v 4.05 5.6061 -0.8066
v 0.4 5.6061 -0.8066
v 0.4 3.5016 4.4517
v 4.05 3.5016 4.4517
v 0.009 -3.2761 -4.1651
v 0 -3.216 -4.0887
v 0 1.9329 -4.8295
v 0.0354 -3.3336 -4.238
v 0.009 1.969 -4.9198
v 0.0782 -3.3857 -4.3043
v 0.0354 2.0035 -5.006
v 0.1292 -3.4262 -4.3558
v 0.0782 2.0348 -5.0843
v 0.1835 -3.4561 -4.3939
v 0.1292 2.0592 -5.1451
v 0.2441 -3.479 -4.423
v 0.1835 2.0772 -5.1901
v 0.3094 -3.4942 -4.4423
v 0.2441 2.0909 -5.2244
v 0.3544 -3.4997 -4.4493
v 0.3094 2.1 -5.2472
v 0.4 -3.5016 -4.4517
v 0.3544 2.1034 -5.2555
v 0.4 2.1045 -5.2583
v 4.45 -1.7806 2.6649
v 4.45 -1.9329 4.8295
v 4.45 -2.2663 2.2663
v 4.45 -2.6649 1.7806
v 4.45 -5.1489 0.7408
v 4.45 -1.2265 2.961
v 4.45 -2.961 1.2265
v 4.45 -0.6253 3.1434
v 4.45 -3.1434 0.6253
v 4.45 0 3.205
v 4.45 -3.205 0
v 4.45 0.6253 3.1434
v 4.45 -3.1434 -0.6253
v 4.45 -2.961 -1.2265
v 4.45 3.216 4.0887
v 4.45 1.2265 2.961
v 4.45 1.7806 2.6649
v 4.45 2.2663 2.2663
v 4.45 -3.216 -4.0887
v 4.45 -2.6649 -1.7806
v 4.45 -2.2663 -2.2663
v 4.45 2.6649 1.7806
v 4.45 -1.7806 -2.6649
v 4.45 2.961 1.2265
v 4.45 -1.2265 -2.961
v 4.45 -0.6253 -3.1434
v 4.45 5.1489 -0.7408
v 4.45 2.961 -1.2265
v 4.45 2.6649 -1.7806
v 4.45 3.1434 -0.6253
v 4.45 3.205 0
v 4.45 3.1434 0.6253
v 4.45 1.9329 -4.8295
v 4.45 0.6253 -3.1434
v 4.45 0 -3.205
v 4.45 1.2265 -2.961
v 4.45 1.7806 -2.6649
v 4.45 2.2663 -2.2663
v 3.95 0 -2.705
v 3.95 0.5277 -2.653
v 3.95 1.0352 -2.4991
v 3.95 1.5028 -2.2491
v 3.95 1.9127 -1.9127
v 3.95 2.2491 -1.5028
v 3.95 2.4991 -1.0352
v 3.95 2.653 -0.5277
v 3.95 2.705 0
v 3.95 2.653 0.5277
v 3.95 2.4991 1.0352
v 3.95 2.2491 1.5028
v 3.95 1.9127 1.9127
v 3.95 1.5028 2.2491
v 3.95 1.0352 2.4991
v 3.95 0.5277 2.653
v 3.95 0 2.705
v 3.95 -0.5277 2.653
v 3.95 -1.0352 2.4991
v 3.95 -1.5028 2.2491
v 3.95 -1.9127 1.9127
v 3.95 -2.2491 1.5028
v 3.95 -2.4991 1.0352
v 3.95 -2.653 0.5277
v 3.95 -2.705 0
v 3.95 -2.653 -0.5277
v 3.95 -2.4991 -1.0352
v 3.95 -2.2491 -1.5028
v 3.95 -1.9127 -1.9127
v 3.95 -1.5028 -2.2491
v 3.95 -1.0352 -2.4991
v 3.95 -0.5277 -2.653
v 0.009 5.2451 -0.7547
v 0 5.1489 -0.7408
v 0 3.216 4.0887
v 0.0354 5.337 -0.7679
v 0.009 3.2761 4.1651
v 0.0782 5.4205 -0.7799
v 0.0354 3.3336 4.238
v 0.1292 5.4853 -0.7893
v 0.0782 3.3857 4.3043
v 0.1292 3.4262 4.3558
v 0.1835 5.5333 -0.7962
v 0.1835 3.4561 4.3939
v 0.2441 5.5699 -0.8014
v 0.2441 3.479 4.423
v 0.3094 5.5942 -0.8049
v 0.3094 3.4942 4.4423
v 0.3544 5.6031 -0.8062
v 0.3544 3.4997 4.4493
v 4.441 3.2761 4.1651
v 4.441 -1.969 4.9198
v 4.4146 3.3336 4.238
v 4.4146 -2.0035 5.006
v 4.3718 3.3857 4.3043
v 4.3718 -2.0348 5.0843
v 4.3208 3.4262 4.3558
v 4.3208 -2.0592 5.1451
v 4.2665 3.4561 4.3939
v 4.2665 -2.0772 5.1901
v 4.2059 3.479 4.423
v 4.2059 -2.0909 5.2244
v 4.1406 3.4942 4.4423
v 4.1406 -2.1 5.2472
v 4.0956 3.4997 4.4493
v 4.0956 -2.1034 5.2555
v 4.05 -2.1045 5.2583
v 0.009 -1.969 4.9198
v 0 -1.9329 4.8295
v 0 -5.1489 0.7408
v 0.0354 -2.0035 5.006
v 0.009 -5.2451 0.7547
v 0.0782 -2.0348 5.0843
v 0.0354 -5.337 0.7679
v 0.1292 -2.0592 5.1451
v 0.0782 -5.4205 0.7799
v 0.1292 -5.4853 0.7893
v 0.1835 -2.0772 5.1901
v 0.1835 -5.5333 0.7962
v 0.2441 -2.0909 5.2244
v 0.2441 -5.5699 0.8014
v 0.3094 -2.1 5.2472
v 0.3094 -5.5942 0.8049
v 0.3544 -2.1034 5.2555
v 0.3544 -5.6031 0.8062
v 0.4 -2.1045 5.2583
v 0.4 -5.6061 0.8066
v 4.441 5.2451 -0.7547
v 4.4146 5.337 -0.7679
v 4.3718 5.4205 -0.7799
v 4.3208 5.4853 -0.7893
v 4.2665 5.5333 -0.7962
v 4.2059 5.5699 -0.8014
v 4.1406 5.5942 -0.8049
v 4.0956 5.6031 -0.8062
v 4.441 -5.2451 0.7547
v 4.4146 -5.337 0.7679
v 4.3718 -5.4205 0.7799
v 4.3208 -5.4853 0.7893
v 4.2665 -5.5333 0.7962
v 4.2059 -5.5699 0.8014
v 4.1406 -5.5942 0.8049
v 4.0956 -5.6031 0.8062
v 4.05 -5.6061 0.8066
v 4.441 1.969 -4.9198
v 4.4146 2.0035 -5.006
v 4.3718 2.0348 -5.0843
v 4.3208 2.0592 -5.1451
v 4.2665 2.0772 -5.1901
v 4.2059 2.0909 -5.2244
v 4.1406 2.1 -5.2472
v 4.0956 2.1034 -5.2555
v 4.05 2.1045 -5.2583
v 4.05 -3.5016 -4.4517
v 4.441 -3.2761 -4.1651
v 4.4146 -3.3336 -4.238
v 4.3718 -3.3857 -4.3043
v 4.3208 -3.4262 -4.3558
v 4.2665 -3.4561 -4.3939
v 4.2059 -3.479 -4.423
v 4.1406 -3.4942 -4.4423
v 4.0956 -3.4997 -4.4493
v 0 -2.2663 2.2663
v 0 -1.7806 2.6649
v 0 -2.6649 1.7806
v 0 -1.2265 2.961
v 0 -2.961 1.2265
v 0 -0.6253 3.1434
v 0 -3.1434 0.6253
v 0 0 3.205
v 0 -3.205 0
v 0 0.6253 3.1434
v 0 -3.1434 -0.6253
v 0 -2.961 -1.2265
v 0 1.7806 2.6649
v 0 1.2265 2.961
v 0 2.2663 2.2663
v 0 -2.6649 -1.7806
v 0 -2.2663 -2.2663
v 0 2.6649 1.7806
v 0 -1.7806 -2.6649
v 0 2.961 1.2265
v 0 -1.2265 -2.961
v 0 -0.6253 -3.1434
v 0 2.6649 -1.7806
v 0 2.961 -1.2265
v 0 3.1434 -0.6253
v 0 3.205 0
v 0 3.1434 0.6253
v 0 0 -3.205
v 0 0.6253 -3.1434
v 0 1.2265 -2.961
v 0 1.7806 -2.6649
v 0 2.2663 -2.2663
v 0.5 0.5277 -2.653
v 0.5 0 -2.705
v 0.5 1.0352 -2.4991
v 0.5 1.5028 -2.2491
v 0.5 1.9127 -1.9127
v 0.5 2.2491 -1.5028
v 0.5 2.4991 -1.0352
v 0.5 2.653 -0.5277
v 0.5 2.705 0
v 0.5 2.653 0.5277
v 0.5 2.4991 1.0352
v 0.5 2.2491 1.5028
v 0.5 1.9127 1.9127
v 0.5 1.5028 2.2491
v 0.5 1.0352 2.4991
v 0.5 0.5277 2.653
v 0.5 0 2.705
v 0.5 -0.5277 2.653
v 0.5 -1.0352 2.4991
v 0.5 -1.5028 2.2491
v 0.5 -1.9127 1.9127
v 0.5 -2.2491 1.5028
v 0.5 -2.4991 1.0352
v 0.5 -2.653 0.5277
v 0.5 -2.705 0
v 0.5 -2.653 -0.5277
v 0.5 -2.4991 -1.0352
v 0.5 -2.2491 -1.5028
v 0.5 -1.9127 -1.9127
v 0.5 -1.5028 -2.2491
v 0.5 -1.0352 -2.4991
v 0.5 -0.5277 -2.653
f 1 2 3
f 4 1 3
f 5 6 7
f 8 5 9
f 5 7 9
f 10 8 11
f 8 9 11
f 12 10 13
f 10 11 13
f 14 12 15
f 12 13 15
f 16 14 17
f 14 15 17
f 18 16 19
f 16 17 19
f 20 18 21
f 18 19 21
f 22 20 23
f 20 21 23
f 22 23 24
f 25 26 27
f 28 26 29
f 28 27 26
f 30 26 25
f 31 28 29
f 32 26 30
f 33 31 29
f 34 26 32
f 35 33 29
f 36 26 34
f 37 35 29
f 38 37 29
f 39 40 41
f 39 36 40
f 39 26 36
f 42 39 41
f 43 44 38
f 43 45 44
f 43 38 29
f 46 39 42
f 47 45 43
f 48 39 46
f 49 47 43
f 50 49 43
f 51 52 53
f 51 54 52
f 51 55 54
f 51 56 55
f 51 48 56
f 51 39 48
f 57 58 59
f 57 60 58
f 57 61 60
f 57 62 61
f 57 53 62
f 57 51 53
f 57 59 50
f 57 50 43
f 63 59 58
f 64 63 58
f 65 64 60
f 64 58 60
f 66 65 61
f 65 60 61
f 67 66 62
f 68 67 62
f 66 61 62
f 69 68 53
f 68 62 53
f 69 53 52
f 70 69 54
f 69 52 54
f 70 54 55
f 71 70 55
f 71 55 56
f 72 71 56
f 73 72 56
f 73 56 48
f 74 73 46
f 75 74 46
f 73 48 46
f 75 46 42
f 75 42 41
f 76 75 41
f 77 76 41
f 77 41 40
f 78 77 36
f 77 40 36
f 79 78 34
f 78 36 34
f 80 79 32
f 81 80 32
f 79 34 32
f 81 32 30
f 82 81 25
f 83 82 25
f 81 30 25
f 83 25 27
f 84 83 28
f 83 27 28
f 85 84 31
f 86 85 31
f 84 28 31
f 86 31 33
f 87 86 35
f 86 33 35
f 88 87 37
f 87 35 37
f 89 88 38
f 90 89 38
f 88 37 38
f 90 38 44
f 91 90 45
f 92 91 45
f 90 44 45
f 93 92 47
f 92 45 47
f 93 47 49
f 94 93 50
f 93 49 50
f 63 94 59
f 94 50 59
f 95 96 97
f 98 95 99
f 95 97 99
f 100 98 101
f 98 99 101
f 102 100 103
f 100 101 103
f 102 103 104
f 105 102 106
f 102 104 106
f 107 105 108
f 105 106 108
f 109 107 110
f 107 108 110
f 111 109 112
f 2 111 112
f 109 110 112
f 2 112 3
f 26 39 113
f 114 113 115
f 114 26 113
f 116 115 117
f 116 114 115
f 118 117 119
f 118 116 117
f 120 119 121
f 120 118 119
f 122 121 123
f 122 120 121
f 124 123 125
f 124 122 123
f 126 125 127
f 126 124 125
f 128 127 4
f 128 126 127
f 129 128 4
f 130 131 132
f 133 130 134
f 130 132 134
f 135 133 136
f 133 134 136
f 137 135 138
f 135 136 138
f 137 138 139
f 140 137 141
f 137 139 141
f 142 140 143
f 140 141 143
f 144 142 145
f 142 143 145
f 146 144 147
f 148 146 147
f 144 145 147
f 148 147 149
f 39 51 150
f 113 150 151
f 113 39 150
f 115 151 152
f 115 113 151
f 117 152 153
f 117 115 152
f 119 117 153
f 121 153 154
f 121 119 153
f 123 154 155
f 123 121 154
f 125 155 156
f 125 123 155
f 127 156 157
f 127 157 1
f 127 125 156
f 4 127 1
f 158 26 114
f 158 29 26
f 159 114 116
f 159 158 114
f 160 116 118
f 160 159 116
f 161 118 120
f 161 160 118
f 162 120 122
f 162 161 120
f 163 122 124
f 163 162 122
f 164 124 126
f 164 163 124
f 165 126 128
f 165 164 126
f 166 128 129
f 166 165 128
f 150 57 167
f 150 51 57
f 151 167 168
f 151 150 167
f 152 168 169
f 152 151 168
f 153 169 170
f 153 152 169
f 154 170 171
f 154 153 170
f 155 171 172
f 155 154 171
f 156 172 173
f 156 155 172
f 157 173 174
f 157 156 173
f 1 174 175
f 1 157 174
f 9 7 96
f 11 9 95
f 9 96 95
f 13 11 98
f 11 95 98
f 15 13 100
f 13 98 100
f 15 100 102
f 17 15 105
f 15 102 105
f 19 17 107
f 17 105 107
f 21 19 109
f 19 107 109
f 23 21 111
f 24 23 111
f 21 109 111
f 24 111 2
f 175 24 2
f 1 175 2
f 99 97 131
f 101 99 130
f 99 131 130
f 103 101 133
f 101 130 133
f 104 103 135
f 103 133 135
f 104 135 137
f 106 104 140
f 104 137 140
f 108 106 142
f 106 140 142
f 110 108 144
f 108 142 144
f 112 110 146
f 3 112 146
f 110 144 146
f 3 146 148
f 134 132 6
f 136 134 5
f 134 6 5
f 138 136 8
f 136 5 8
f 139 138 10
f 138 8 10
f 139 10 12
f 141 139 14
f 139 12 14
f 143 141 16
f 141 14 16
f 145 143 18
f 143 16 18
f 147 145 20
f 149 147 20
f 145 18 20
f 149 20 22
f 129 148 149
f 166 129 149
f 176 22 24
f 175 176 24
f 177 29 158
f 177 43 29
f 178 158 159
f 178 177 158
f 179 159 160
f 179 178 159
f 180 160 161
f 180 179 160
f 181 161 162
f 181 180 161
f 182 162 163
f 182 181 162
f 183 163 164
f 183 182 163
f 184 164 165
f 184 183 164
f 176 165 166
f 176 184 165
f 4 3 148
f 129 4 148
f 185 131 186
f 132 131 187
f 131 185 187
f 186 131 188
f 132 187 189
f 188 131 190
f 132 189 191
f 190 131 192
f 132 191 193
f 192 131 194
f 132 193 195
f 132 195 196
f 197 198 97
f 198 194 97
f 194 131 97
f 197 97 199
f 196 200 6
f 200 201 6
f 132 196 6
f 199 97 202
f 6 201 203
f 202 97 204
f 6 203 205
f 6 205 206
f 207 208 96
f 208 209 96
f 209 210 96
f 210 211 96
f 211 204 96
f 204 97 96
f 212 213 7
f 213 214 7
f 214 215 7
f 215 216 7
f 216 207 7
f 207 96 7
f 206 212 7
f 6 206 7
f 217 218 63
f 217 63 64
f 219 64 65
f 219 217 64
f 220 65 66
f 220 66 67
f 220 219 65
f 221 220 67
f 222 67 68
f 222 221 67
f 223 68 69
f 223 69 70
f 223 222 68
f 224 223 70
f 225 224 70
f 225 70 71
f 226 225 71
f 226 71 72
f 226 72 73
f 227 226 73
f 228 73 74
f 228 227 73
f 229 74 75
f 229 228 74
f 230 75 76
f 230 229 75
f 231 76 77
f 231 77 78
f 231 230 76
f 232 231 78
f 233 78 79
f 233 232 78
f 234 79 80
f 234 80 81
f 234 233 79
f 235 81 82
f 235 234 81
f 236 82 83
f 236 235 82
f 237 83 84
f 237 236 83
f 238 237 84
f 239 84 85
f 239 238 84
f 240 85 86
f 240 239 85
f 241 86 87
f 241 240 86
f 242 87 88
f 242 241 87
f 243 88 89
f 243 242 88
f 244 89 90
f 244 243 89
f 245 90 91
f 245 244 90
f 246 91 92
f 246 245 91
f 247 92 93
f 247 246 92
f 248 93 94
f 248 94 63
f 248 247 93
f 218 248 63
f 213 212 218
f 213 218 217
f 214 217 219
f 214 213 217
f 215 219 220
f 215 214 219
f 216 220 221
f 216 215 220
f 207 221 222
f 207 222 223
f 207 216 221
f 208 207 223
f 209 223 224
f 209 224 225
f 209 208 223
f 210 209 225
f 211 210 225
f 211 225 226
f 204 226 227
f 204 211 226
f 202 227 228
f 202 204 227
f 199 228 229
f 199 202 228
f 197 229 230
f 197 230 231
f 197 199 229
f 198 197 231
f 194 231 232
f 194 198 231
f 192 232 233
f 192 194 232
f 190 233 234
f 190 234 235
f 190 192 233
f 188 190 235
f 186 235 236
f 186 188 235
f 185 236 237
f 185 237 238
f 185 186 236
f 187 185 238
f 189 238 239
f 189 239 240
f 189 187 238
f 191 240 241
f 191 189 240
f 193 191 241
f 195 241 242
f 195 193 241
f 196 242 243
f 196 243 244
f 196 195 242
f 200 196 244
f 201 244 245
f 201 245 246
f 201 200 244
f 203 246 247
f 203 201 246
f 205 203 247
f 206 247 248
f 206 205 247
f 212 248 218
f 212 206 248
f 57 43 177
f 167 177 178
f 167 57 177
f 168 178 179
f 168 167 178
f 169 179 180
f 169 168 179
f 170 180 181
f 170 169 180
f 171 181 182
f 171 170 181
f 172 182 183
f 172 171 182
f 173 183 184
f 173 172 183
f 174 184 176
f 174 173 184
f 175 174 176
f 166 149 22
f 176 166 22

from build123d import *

# Parameters (mm, degrees)
SKETCH1_R           = 2.705
BOSS_EXTRUDE1_DEPTH = 4.45
CHAMFER1_SIZE       = 0.5
FILLET1_R           = 0.4


with BuildPart() as part:
    # Sketch1 → Boss-Extrude1 (new body)
    with BuildSketch(Plane(origin=(0, 0, 0), x_dir=(0, 0, -1), z_dir=(1, 0, 0))):
        Polygon((0.806629144, 5.606072549), (-4.451686671, 3.501597604), (-5.258315815, -2.104474945), (-0.806629144, -5.606072549), (4.451686671, -3.501597604), (5.258315815, 2.104474945), align=None)
        Circle(SKETCH1_R, mode=Mode.SUBTRACT)
    extrude(amount=BOSS_EXTRUDE1_DEPTH)

    # Chamfer1
    chamfer1_edges = [part.edges().sort_by_distance(p)[0] for p in [
        (0, 0, 2.705),
        (4.45, 0, 2.705),
    ]]
    chamfer(chamfer1_edges, length=CHAMFER1_SIZE)

    # Fillet1
    fillet1_edges = [part.edges().sort_by_distance(p)[0] for p in [
        (4.45, 0.69856133, 4.855001243),
        (4.45, -3.855273747, 3.032472479),
        (4.45, -4.553835077, -1.822528764),
        (4.45, -0.69856133, -4.855001243),
        (4.45, 3.855273747, -3.032472479),
        (0, -0.69856133, -4.855001243),
        (0, -4.553835077, -1.822528764),
        (0, -3.855273747, 3.032472479),
        (0, 0.69856133, 4.855001243),
        (0, 4.553835077, 1.822528764),
        (0, 3.855273747, -3.032472479),
        (4.45, 4.553835077, 1.822528764),
    ]]
    fillet(fillet1_edges, radius=FILLET1_R)


solid = part.part
